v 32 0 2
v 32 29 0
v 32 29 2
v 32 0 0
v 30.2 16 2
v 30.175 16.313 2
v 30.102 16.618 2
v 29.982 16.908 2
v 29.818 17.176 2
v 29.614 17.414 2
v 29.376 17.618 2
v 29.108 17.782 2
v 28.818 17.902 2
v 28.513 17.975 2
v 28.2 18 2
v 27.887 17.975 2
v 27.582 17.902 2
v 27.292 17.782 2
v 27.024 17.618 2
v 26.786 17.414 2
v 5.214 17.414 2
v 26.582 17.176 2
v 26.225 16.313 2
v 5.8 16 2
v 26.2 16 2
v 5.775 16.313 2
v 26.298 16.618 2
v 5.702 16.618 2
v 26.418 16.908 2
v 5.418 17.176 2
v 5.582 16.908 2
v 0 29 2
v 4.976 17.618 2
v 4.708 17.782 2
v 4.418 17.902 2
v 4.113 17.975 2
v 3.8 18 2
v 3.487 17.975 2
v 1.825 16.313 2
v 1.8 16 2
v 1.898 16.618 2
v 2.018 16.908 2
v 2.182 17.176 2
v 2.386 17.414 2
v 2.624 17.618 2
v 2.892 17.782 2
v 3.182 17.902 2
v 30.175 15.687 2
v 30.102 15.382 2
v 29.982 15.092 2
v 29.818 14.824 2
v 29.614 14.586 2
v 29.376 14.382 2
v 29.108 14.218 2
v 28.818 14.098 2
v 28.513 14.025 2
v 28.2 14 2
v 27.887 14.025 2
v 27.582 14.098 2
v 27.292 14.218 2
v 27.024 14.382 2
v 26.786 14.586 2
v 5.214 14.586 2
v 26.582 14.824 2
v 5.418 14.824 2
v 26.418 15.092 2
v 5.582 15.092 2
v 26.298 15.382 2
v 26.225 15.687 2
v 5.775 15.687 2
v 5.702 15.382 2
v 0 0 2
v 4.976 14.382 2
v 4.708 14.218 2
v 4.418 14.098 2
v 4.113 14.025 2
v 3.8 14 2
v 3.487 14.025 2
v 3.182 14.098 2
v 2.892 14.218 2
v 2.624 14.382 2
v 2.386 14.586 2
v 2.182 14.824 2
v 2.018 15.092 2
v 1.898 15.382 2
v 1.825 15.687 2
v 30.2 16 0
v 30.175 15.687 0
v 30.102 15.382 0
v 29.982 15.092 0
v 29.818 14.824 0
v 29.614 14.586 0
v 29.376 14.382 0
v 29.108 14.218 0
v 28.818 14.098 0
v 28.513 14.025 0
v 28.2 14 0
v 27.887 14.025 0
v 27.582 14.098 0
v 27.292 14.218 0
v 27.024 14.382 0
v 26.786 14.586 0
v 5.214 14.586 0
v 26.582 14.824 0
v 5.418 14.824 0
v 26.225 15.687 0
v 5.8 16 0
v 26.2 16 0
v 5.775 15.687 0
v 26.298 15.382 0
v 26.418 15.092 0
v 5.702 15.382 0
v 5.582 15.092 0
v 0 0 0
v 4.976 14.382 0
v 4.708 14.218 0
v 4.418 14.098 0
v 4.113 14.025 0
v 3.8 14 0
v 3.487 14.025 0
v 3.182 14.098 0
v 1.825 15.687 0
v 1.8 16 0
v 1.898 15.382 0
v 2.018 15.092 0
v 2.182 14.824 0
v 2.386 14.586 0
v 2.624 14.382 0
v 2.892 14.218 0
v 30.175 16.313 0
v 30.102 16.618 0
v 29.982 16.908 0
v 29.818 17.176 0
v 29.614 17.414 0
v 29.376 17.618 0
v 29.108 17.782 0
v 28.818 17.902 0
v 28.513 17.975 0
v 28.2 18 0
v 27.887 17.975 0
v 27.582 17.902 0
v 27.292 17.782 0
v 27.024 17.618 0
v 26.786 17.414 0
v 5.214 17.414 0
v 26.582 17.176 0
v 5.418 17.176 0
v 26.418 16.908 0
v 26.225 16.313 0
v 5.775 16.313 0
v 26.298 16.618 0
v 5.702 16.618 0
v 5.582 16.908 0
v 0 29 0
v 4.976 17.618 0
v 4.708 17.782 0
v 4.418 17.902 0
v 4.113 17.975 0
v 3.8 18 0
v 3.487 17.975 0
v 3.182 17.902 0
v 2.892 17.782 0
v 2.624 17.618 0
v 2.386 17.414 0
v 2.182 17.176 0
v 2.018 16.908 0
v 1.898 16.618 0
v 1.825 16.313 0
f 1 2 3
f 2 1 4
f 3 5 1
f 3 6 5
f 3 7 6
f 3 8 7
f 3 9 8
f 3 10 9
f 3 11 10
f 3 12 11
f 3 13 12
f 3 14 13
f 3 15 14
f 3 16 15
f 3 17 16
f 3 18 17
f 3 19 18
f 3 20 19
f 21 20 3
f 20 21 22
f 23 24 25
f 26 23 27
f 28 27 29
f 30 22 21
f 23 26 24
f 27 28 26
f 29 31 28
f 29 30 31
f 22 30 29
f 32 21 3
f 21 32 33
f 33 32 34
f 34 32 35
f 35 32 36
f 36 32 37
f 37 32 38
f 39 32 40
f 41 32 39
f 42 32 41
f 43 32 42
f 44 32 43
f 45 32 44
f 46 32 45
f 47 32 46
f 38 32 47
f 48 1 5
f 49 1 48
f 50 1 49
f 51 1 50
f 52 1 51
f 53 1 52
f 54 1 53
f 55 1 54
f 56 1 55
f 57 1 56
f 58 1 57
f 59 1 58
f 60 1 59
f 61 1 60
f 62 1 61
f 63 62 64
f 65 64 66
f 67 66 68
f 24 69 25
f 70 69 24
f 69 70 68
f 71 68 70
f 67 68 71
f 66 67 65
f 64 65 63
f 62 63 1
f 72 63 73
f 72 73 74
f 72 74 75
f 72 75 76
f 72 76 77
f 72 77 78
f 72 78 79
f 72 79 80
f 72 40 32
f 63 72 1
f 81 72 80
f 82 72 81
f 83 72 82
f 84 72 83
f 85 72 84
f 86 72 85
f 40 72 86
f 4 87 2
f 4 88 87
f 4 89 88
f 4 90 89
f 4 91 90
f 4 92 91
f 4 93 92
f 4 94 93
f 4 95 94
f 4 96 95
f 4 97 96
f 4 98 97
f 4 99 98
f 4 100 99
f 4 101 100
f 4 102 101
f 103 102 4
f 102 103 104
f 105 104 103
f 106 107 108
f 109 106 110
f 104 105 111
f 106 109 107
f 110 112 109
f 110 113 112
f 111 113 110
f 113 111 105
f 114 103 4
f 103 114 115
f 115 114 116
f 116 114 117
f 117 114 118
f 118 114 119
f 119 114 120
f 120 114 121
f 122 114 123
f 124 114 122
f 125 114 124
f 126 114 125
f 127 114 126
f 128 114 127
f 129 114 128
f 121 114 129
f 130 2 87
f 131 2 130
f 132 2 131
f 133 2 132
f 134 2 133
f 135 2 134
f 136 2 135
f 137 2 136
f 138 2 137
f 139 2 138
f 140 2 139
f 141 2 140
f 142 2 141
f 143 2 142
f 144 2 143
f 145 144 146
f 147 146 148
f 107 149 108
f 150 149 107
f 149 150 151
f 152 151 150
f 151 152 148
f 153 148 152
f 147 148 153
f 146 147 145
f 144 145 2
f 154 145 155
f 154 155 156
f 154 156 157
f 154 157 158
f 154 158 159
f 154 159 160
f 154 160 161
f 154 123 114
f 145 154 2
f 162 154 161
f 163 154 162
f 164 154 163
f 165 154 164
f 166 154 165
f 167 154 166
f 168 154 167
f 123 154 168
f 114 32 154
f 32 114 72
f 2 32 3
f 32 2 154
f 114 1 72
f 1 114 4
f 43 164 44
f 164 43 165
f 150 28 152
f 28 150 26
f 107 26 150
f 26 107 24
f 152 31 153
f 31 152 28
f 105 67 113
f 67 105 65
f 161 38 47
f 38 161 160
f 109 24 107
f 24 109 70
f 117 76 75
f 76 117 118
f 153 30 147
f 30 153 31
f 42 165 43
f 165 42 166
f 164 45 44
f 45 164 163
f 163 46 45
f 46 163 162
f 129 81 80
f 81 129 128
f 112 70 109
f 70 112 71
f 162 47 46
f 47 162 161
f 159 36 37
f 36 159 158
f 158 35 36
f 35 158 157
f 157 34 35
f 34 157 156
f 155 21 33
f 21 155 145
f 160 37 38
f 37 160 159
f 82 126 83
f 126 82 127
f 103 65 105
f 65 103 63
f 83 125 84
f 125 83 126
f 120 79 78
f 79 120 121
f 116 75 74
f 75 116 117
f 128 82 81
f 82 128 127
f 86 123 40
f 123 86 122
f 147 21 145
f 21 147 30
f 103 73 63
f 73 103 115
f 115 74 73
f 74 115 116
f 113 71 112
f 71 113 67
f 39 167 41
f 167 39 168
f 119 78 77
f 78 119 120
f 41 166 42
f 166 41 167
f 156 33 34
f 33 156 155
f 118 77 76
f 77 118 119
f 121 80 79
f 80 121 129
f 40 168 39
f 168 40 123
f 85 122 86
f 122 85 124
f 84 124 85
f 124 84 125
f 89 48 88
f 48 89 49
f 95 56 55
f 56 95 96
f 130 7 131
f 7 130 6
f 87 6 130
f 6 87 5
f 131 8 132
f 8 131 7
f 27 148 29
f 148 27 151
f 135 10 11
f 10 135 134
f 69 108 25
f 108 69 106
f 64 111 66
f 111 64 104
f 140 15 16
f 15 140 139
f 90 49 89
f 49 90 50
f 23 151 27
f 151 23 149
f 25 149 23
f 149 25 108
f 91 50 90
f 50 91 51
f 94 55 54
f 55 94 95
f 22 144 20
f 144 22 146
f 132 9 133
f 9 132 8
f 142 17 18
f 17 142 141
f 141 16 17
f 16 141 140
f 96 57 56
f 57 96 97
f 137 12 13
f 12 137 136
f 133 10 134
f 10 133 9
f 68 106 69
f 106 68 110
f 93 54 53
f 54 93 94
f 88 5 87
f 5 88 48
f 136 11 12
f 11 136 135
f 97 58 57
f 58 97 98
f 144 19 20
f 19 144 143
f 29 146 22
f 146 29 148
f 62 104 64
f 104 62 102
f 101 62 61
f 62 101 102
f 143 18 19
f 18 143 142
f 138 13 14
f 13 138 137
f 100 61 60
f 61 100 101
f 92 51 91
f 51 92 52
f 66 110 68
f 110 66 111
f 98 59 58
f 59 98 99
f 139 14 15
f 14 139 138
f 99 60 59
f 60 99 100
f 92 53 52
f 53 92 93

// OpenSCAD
// -------------- Measurements -----------------
plateWidth = 32;
plateHeight = 29;
plateThickness = 2;

holeDistanceTop = 11;
holeDistanceSides = 1.8;
holeDiameter = 4;

// ------------------ Computed --------------------- 

holeDistanceBottom = plateHeight - (holeDistanceTop + holeDiameter/2);
holeDistanceLeft = holeDistanceSides + holeDiameter/2;
holeDistanceRight = plateWidth - (holeDistanceSides + holeDiameter/2);

echo(str("holeDistanceLeft: ", holeDistanceLeft));
echo(str("holeDistanceRight: ", holeDistanceRight));
echo(str("holeDistanceBottom: ", holeDistanceBottom));

// ------------- Print Settings ----------------

faceplate = false;
$fn = 40;

// ---------------- Modules --------------------

module hole() {
  cylinder(d=holeDiameter, h=plateThickness, center = false);
}

module plate() {

  difference() {
    // panel
    cube([plateWidth, plateHeight, plateThickness]);

    // holes
    translate([holeDistanceLeft, holeDistanceBottom, 0])
      hole();
    translate([holeDistanceRight, holeDistanceBottom, 0])
      hole();

  }

}

plate();
